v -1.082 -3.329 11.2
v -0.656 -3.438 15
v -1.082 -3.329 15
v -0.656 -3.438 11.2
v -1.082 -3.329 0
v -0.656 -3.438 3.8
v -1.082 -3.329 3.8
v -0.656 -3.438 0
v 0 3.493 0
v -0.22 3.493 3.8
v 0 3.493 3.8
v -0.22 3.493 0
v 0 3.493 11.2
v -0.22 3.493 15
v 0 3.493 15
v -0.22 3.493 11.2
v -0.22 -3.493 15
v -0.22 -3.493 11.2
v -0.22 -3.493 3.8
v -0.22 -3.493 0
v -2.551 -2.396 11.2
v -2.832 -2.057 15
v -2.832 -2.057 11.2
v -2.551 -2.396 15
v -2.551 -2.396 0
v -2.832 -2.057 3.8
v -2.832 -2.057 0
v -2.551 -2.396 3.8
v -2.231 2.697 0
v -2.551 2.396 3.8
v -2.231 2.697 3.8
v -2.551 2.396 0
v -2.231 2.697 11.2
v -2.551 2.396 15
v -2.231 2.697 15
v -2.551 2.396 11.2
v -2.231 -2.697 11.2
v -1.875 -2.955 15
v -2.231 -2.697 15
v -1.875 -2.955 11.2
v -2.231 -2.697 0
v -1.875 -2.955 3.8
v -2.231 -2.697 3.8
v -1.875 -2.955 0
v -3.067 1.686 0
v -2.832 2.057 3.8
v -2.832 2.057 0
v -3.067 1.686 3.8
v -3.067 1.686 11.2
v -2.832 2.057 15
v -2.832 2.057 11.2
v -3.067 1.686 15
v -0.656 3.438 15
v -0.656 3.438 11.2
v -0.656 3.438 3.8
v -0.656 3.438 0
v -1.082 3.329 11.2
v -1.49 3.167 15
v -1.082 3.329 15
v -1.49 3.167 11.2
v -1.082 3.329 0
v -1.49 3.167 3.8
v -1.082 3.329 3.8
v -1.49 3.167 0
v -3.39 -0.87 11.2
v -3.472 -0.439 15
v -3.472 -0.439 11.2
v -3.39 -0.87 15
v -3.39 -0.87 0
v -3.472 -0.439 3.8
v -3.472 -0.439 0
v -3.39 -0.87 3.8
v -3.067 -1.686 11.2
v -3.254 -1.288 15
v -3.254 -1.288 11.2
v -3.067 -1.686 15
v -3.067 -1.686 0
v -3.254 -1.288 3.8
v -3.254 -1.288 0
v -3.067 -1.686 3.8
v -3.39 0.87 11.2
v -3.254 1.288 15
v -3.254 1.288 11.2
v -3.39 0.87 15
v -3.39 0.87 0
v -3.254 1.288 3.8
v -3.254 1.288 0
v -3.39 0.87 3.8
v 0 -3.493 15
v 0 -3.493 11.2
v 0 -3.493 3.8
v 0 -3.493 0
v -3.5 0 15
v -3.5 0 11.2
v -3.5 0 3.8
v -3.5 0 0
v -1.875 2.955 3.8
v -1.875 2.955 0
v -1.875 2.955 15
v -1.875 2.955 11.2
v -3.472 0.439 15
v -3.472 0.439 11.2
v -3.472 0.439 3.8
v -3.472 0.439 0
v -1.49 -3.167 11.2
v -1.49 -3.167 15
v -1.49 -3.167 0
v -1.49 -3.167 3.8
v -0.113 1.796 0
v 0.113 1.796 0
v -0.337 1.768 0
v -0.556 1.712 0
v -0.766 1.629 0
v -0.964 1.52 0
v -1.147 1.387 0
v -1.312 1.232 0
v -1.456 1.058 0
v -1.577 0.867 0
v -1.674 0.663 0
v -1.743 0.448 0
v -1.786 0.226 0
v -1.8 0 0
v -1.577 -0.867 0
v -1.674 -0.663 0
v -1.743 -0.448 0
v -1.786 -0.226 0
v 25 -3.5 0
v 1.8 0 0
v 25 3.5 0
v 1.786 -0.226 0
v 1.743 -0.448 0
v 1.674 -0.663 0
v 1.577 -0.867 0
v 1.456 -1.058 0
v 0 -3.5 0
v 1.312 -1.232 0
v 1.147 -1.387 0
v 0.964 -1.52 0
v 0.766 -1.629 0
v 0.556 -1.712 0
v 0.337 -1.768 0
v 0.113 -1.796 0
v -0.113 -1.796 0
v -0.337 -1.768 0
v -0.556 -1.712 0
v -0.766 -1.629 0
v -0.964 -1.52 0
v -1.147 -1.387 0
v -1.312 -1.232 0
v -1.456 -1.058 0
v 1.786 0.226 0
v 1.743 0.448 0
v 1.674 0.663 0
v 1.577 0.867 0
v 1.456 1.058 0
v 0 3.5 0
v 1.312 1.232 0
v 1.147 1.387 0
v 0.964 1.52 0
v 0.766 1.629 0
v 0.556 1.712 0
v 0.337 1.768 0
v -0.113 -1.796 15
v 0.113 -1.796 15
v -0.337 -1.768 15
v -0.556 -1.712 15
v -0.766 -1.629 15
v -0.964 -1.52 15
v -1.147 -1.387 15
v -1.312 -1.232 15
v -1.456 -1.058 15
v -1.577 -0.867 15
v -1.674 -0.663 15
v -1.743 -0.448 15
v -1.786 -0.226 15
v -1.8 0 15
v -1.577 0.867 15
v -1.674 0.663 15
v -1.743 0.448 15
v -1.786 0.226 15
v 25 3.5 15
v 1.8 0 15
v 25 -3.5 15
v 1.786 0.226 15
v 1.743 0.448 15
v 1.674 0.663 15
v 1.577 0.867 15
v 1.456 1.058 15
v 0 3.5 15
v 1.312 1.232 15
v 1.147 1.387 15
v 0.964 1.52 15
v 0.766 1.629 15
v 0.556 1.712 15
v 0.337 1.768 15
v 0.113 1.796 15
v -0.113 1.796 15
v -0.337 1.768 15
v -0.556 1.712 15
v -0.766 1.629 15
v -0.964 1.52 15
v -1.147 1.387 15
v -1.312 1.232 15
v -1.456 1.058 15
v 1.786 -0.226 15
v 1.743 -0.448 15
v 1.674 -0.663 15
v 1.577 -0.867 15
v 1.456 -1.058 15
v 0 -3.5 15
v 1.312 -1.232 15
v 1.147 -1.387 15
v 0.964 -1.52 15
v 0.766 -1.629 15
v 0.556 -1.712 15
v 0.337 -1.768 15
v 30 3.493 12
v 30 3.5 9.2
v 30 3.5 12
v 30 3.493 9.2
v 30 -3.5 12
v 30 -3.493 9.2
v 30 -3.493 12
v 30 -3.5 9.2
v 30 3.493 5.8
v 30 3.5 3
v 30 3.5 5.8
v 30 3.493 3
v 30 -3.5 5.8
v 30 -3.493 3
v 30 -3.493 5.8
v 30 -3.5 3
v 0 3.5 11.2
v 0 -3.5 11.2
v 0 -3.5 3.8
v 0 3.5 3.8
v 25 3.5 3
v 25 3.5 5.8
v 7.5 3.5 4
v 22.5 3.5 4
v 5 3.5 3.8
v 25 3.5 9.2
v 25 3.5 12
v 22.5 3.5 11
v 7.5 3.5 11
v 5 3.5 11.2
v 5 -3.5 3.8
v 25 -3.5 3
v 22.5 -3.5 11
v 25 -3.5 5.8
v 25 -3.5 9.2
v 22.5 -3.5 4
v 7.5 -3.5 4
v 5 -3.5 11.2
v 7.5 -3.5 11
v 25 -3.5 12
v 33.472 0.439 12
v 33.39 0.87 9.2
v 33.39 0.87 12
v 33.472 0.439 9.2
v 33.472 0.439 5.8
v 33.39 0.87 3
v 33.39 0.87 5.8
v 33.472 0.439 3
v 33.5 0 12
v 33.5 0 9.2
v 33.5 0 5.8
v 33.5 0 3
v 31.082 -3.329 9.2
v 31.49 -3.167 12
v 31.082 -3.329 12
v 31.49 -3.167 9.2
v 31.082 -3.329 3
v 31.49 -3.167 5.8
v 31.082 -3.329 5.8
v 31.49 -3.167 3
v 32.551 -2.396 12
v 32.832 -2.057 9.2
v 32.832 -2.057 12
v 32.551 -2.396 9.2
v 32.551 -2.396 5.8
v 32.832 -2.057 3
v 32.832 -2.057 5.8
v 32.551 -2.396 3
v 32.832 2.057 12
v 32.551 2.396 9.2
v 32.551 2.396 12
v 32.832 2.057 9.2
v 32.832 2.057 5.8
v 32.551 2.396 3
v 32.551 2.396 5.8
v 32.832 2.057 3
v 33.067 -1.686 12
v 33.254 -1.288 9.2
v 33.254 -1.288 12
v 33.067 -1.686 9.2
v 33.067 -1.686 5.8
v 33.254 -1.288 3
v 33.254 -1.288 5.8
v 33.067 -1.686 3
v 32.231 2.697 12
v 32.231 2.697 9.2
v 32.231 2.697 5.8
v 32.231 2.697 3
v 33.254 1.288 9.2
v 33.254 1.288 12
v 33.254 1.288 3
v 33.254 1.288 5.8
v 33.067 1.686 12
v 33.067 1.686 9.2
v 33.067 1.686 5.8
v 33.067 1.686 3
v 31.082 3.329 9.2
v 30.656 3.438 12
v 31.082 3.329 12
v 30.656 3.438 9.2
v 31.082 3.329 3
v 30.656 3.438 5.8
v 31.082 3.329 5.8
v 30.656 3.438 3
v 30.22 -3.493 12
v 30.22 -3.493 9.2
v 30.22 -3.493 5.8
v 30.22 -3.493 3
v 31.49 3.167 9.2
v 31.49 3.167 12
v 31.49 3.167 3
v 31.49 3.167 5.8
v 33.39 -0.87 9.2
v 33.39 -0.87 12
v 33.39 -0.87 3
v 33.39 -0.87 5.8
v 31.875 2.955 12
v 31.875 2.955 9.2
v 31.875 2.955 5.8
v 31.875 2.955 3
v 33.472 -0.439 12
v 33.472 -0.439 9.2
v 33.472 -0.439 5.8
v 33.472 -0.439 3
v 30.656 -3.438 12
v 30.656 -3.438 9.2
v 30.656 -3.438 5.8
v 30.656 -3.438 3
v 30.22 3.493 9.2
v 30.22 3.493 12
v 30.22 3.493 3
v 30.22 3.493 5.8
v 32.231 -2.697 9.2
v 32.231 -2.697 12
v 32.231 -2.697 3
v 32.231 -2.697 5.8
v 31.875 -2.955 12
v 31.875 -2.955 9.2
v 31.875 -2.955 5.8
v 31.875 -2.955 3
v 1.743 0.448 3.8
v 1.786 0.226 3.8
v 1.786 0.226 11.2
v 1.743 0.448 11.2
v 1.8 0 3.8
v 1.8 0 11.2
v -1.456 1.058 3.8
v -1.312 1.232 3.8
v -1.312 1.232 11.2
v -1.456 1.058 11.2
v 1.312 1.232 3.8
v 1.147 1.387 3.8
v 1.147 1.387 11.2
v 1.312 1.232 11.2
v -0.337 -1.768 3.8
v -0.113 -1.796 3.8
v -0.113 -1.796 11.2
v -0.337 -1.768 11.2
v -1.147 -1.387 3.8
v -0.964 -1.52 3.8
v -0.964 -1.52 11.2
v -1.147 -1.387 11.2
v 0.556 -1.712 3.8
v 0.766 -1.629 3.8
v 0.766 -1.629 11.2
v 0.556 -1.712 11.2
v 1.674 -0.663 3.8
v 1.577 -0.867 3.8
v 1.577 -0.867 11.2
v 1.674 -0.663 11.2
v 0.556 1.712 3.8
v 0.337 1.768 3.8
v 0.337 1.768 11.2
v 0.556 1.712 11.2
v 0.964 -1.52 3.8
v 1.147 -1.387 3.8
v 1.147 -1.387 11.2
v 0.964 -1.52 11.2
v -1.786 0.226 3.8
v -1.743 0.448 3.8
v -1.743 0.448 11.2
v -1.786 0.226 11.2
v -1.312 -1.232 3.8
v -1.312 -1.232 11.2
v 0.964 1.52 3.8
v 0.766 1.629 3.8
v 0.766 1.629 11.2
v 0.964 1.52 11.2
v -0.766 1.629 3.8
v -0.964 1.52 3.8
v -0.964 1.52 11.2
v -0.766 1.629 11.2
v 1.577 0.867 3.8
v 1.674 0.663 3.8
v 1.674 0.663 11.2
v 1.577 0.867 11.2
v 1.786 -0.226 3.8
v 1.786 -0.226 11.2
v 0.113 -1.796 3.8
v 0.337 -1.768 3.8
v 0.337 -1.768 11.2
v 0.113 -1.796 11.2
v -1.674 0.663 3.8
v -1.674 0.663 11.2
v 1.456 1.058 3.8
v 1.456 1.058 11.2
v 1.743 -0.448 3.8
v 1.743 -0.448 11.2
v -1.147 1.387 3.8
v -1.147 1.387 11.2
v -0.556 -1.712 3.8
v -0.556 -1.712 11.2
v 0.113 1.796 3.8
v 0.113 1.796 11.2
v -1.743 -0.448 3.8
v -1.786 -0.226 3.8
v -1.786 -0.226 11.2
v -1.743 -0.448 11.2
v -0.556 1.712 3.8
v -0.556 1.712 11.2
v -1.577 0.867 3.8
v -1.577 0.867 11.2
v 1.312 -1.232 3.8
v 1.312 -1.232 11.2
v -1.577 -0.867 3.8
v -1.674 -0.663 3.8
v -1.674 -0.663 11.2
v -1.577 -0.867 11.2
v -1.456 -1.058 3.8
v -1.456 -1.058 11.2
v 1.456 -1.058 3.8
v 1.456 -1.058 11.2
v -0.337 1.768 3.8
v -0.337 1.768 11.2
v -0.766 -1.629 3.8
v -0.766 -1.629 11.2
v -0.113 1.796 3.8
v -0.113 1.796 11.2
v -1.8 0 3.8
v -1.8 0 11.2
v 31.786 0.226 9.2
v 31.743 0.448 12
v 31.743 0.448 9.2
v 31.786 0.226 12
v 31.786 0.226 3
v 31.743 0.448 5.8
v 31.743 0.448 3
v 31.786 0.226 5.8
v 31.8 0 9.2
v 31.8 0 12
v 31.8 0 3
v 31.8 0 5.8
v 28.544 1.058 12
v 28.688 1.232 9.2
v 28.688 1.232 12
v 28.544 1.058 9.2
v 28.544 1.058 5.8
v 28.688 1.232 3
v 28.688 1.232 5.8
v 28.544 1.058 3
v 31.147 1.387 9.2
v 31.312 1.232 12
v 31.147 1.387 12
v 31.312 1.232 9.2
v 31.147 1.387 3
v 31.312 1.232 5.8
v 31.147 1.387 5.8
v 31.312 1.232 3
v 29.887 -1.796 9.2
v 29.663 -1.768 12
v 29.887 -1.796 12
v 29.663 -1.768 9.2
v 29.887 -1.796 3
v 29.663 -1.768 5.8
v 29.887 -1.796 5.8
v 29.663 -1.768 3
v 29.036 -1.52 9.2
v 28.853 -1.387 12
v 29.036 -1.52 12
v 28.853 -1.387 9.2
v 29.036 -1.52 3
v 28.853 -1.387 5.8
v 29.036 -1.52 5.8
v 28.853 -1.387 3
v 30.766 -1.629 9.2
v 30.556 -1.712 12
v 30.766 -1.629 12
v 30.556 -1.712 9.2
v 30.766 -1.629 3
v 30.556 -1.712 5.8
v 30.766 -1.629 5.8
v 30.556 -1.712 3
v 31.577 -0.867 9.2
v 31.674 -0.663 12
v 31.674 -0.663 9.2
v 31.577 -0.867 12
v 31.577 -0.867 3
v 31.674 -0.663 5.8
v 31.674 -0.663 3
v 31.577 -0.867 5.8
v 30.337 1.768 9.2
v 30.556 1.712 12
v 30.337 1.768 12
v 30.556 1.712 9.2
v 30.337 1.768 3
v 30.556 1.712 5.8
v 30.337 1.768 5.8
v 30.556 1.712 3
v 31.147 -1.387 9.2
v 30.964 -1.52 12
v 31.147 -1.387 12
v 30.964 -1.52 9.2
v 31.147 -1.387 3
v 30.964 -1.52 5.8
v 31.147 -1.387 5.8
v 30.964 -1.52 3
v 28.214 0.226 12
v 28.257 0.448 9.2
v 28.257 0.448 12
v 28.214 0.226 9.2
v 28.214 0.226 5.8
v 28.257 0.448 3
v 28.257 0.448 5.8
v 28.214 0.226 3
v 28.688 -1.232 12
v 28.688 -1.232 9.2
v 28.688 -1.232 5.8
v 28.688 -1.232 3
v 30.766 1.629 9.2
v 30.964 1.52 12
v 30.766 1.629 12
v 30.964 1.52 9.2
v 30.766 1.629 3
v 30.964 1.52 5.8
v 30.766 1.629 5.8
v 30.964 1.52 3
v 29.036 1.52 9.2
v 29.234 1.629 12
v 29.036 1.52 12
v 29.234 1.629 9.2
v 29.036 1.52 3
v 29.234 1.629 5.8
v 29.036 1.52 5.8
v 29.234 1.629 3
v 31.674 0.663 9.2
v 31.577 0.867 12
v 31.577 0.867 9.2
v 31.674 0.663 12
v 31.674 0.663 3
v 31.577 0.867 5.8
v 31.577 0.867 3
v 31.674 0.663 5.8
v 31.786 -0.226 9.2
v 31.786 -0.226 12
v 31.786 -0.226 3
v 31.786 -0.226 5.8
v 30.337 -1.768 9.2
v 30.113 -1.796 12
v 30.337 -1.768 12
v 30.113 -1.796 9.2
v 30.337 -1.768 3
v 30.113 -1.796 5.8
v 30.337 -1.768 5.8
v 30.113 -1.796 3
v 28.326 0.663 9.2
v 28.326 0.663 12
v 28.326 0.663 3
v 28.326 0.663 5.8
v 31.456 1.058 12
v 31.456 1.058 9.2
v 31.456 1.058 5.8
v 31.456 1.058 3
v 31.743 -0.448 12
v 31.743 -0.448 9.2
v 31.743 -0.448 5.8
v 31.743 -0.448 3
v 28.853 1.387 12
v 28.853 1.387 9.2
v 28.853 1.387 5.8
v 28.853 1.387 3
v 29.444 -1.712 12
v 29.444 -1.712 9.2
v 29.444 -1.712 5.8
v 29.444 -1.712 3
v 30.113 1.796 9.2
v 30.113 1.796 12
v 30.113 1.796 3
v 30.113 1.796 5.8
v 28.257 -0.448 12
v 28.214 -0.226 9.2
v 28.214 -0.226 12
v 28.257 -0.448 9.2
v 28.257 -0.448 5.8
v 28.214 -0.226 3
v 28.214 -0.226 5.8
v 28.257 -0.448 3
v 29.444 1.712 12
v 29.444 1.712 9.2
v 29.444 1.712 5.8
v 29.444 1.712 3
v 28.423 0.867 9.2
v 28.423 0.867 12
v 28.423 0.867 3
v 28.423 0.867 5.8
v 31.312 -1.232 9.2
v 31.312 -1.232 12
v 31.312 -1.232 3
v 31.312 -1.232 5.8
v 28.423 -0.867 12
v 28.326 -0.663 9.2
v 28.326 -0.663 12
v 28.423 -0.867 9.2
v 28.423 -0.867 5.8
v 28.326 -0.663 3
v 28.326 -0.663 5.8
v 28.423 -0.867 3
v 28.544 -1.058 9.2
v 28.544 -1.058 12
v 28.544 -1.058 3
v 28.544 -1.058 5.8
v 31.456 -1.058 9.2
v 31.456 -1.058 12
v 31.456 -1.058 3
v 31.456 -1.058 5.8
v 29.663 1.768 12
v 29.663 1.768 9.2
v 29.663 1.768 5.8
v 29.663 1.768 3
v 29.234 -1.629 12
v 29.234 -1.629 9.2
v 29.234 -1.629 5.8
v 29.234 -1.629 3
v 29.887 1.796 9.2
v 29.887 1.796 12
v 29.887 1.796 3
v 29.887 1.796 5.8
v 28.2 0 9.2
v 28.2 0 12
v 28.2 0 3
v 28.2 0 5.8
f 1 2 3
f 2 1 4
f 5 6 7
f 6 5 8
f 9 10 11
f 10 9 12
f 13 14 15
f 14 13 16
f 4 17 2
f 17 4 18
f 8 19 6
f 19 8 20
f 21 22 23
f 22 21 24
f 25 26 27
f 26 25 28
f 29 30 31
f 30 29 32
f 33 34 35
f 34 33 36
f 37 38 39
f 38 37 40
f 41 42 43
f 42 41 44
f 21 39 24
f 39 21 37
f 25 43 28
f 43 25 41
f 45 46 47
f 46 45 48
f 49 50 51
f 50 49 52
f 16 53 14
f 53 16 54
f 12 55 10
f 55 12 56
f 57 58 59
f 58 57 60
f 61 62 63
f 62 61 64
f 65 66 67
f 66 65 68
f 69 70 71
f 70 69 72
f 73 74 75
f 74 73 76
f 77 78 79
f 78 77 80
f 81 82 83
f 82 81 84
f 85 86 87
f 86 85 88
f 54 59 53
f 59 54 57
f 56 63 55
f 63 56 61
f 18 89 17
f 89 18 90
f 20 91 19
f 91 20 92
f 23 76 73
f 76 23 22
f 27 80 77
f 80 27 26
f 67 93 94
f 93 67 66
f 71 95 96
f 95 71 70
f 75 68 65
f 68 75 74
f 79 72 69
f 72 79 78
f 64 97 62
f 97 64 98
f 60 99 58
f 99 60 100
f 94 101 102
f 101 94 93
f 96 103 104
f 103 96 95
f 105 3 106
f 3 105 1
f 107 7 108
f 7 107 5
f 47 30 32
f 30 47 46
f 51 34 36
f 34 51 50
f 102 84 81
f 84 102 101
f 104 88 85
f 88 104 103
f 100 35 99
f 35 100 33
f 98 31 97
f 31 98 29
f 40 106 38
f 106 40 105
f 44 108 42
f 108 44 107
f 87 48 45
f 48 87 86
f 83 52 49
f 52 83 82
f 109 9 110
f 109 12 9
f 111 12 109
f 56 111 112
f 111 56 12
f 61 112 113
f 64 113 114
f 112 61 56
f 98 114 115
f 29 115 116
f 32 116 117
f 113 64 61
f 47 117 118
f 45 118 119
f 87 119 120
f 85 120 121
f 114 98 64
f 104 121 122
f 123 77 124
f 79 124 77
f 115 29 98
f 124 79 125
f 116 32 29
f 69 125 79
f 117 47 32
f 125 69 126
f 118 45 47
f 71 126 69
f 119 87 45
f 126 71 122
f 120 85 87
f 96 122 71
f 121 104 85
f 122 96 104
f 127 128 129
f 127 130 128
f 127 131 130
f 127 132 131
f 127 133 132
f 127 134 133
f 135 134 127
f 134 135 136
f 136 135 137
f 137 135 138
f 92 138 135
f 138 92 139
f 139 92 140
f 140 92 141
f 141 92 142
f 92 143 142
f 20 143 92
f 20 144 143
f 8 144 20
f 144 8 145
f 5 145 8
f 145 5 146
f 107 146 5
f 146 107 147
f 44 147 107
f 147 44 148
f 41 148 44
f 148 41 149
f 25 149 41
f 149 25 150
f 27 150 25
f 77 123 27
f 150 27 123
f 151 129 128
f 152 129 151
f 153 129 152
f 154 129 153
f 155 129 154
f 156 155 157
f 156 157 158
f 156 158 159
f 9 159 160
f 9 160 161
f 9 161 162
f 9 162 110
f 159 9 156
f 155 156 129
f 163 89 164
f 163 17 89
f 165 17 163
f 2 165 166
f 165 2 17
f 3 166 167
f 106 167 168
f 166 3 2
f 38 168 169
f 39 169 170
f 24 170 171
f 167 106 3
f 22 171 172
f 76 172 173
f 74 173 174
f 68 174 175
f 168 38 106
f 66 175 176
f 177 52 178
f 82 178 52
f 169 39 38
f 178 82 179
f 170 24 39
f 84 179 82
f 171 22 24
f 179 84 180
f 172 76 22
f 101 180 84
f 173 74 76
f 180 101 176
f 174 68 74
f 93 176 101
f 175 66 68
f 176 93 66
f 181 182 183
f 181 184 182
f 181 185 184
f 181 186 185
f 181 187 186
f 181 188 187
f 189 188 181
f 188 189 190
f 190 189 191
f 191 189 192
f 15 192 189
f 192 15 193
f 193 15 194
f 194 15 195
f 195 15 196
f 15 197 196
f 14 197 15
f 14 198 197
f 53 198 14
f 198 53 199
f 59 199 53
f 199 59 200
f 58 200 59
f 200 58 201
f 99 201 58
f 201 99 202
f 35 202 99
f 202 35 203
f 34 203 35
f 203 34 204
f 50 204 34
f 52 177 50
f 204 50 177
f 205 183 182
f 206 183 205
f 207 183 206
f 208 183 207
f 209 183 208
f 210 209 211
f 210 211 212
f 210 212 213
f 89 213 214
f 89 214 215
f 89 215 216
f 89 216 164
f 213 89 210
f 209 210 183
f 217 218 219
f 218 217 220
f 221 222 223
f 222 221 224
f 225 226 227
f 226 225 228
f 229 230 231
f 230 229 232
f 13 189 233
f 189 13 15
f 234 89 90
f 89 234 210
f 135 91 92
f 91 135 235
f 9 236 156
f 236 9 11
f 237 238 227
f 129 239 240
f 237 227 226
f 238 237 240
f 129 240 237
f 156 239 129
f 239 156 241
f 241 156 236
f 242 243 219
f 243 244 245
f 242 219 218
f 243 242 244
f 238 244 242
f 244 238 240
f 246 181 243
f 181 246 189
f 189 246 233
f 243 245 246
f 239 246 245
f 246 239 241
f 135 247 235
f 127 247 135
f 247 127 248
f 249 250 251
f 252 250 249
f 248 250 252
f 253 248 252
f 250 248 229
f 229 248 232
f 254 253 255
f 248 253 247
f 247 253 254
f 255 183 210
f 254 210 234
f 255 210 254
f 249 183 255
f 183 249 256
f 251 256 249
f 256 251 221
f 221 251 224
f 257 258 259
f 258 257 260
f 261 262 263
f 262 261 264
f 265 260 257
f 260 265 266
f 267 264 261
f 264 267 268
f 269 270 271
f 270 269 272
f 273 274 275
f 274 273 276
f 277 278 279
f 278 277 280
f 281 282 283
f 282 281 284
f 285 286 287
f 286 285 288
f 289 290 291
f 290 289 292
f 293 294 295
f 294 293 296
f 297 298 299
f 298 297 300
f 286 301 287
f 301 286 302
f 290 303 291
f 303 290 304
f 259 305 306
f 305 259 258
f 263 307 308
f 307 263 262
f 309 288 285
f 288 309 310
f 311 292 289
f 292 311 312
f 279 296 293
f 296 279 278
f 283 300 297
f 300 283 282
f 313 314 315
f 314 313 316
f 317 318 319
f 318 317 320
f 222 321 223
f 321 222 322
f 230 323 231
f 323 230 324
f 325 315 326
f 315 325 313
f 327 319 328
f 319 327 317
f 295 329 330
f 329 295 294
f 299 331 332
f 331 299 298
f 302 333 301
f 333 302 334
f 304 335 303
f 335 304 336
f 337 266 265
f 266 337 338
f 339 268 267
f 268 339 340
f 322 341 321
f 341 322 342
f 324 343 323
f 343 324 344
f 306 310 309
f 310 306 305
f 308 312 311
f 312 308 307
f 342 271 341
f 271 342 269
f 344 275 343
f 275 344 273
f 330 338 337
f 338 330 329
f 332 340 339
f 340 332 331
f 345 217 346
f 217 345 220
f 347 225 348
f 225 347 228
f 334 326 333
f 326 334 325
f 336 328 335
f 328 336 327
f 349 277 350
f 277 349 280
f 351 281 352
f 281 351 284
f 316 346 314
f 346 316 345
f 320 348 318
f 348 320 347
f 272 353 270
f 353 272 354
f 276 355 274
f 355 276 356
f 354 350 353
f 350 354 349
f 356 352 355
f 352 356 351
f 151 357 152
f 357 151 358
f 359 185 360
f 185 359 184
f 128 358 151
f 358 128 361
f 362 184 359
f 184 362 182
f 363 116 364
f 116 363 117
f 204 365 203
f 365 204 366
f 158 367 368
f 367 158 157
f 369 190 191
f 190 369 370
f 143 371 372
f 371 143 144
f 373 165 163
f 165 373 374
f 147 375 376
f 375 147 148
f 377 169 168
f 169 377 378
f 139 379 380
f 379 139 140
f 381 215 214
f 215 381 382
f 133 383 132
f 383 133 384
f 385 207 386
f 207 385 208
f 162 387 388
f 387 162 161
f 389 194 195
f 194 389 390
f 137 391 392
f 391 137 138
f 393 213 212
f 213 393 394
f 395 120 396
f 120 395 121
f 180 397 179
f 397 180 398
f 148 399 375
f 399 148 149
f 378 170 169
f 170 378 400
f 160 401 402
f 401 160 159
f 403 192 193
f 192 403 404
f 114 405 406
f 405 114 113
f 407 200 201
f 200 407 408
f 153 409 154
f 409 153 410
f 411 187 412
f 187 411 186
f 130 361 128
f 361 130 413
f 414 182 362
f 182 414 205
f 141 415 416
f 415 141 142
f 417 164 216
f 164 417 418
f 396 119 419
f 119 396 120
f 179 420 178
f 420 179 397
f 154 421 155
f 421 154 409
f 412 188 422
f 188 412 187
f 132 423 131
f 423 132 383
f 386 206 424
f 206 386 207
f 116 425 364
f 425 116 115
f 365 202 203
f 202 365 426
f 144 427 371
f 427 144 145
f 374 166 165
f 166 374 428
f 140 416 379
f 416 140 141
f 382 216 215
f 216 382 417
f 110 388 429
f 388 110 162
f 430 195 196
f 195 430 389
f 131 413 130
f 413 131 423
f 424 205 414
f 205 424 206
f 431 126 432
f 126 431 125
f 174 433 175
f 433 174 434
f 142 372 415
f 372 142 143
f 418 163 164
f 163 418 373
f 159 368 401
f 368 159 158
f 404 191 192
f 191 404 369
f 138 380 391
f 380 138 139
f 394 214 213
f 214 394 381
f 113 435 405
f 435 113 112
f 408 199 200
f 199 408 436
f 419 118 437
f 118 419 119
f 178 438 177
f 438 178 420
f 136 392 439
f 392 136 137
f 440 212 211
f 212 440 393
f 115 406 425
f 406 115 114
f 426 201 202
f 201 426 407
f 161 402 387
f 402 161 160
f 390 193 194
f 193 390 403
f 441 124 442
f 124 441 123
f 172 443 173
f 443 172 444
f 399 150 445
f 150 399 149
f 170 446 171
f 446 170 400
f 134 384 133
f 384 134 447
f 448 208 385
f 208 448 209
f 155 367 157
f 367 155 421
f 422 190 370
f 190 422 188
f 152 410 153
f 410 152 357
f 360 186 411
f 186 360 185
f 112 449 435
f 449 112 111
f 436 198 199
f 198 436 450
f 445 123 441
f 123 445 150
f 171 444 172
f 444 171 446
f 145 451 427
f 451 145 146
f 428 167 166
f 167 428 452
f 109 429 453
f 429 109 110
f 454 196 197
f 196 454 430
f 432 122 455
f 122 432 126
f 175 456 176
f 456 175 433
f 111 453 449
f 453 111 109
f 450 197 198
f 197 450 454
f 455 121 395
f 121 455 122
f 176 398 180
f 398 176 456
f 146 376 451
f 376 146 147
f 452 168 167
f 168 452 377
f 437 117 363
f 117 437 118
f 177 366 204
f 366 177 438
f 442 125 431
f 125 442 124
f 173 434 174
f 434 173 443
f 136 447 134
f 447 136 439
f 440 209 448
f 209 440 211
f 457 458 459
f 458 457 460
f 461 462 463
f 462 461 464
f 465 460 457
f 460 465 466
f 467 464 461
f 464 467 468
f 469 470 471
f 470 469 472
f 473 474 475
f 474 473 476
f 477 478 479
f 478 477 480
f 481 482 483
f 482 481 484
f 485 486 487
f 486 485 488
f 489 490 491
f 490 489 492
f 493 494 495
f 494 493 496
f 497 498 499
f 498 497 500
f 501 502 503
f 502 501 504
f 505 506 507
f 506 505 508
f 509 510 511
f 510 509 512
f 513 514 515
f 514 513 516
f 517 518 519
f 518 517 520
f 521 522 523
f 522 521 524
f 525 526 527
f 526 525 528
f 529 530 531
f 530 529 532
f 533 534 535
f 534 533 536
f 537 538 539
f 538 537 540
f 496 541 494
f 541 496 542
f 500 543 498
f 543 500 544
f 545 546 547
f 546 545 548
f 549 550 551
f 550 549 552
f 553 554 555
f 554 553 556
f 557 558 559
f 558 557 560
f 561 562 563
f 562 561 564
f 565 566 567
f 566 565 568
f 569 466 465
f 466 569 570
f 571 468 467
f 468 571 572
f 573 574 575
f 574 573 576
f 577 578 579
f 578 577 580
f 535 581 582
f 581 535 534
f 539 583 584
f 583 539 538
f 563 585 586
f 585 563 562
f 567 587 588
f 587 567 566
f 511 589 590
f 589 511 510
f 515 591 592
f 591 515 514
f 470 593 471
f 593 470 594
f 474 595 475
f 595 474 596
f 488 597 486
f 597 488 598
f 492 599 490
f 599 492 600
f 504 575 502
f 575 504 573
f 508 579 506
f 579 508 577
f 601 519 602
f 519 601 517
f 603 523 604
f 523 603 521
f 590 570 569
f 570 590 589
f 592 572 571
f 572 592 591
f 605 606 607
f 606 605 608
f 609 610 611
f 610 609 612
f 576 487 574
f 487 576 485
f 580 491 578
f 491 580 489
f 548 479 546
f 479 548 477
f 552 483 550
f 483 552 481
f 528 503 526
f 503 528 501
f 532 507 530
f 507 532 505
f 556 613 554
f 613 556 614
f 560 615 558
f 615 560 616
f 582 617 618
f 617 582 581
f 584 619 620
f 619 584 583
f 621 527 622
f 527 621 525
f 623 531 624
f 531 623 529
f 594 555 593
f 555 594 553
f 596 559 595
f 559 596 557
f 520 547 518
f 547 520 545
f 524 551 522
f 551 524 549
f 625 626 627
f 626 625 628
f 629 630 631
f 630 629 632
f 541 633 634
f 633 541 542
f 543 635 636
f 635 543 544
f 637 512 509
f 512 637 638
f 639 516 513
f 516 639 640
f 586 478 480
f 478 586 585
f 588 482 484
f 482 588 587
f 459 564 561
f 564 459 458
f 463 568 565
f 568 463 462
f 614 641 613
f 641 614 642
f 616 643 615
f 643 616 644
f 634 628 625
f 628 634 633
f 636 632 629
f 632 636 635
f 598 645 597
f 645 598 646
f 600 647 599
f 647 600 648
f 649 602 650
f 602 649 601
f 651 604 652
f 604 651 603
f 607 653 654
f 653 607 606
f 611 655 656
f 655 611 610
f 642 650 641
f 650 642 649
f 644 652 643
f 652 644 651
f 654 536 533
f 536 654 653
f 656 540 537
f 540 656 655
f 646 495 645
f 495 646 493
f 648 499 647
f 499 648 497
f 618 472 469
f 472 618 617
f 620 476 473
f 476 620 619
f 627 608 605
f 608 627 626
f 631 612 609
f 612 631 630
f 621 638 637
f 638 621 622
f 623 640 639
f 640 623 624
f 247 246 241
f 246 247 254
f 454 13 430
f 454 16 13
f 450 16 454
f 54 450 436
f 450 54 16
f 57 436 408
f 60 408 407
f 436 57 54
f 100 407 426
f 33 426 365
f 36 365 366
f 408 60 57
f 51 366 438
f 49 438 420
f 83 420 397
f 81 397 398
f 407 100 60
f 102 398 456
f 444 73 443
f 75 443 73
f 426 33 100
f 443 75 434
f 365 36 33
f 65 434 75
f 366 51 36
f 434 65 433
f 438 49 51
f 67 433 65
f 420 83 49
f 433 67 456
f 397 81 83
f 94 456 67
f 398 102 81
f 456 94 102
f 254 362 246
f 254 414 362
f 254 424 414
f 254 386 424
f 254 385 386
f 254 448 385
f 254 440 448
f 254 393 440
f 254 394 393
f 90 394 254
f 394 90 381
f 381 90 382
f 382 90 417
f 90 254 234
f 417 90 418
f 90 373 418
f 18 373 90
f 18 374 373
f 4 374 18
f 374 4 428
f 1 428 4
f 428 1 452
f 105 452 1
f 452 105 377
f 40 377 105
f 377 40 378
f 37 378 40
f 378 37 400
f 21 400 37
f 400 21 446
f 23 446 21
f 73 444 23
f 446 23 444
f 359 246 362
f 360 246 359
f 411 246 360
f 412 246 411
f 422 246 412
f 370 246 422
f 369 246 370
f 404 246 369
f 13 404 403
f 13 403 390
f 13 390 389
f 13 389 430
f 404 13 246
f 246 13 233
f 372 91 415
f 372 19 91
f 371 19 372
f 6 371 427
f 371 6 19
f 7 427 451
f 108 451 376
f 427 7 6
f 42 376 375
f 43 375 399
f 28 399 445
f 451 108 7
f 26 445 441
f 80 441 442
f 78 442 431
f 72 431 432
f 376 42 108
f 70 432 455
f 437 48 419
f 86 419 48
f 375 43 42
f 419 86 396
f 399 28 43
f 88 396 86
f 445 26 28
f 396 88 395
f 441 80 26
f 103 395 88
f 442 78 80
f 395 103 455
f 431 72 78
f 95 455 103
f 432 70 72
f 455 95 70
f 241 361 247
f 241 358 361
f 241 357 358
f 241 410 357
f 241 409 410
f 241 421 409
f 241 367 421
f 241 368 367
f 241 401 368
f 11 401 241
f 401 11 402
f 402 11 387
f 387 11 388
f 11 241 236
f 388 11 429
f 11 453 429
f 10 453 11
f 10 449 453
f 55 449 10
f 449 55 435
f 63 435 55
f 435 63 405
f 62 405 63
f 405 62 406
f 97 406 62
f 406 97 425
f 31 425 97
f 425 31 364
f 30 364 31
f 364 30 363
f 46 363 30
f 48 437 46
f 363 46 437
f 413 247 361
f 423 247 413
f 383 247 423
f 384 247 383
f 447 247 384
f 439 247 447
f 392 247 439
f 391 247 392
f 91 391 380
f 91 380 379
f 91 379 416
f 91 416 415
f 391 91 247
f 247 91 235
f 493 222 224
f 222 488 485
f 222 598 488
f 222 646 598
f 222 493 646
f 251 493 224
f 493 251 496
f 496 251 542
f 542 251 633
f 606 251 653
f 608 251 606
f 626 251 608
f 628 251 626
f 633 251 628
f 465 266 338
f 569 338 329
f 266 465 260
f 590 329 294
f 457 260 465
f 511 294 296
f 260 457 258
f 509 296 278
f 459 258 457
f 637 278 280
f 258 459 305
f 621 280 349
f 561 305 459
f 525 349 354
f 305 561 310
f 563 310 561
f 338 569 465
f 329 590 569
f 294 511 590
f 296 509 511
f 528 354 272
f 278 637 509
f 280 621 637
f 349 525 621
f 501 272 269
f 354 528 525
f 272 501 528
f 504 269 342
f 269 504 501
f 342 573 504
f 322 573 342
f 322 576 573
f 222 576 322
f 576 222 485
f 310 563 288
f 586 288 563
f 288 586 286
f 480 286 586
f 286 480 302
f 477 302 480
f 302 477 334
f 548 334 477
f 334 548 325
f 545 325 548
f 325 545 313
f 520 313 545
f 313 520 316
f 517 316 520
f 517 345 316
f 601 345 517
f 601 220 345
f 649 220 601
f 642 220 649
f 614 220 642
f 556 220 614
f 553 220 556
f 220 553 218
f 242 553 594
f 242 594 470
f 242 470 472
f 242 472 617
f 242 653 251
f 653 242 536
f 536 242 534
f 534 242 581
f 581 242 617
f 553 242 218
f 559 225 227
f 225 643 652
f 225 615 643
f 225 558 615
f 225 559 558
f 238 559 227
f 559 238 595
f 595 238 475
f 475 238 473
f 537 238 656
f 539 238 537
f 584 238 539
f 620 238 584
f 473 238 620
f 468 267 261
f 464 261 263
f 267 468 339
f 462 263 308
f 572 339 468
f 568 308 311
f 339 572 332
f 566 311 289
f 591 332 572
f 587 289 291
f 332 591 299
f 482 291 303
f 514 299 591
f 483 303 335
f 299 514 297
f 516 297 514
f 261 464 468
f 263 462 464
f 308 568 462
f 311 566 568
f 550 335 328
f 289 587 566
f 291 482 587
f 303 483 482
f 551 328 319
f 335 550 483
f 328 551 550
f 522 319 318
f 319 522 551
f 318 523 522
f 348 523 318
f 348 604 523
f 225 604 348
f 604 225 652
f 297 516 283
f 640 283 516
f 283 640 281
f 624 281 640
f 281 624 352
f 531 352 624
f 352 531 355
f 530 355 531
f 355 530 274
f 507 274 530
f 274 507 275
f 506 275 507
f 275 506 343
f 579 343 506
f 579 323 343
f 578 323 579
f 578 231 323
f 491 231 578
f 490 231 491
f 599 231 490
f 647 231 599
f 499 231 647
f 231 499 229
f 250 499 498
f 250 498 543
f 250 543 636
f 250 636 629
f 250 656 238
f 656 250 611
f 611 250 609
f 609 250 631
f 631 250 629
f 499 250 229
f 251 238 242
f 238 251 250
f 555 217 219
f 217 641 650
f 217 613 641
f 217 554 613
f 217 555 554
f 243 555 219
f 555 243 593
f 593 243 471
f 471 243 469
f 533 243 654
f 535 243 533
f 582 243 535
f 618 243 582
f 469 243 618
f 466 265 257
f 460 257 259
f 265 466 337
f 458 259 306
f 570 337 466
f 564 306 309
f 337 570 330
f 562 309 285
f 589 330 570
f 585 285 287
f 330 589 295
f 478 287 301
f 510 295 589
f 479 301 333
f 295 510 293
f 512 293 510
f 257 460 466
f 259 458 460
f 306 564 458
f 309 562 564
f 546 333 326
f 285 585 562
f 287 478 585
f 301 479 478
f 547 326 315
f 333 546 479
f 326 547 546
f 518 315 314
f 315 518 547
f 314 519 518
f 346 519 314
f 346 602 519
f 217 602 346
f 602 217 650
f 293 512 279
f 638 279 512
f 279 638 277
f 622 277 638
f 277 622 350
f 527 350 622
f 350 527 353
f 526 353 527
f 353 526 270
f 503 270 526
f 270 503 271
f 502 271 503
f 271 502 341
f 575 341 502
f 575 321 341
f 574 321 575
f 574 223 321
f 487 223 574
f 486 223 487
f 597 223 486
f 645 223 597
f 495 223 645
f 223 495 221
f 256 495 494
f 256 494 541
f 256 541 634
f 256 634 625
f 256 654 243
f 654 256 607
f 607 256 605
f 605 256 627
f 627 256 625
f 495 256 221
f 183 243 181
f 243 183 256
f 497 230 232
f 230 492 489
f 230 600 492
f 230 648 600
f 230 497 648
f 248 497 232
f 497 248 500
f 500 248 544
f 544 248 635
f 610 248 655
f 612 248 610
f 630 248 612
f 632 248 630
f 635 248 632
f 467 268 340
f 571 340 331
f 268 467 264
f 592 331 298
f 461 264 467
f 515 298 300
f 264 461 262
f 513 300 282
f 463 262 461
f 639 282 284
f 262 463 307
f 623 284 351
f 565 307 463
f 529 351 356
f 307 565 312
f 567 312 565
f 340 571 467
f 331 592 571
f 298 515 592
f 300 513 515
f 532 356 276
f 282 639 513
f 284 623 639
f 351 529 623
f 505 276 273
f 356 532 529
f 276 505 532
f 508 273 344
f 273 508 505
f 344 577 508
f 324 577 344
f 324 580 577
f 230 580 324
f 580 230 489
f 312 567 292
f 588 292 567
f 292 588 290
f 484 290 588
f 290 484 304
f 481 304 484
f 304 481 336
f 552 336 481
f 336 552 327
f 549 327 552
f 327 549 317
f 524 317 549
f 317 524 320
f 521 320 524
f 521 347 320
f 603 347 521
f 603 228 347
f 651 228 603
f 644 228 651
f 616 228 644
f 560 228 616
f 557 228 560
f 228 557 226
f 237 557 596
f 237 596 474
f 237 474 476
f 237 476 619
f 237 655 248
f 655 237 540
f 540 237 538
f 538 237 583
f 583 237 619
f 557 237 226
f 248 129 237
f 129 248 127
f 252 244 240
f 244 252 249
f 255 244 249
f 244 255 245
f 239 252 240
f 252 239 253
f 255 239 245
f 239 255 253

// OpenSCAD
height = 7 + 4 + 4;

difference(){
    union(){
        cylinder( h = height, r = 3.5, $fn = 50 );
    
        translate( [ 0, -3.5, 0 ] )
            cube( [ 30, 7, height ] );
    
        translate( [ 30, 0, 0 ] )
            cylinder( h = height, r = 3.5, $fn = 50 );
    }
    
    translate( [ 0, 0, -1 ] )
        cylinder( h = height + 2, r = 1.8, $fn = 50 );

    translate( [ 30, 0, -1 ] )
        cylinder( h = height + 2, r = 1.8, $fn = 50 );

    translate( [ -5, -5, ( height - 7.4 ) / 2 ] )
        cube( [ 10, 10, 7.4 ] );

    translate( [ 25, -5, ( height - 3.4 ) / 2 ] )
        cube( [ 10, 10, 3.4 ] );

    translate( [ 25, -5, ( height - 3.4 ) / 2 + 3.4 + 2.8 ] )
        cube( [ 10, 10, 3.4 ] );

    translate( [ 25, -5, ( height - 3.4 ) / 2 - 3.4 - 2.8 ] )
        cube( [ 10, 10, 3.4 ] );
    
    translate( [ 7.5, -5, 4 ] )
        cube( [ 15, 10, height - 8 ] );
}
